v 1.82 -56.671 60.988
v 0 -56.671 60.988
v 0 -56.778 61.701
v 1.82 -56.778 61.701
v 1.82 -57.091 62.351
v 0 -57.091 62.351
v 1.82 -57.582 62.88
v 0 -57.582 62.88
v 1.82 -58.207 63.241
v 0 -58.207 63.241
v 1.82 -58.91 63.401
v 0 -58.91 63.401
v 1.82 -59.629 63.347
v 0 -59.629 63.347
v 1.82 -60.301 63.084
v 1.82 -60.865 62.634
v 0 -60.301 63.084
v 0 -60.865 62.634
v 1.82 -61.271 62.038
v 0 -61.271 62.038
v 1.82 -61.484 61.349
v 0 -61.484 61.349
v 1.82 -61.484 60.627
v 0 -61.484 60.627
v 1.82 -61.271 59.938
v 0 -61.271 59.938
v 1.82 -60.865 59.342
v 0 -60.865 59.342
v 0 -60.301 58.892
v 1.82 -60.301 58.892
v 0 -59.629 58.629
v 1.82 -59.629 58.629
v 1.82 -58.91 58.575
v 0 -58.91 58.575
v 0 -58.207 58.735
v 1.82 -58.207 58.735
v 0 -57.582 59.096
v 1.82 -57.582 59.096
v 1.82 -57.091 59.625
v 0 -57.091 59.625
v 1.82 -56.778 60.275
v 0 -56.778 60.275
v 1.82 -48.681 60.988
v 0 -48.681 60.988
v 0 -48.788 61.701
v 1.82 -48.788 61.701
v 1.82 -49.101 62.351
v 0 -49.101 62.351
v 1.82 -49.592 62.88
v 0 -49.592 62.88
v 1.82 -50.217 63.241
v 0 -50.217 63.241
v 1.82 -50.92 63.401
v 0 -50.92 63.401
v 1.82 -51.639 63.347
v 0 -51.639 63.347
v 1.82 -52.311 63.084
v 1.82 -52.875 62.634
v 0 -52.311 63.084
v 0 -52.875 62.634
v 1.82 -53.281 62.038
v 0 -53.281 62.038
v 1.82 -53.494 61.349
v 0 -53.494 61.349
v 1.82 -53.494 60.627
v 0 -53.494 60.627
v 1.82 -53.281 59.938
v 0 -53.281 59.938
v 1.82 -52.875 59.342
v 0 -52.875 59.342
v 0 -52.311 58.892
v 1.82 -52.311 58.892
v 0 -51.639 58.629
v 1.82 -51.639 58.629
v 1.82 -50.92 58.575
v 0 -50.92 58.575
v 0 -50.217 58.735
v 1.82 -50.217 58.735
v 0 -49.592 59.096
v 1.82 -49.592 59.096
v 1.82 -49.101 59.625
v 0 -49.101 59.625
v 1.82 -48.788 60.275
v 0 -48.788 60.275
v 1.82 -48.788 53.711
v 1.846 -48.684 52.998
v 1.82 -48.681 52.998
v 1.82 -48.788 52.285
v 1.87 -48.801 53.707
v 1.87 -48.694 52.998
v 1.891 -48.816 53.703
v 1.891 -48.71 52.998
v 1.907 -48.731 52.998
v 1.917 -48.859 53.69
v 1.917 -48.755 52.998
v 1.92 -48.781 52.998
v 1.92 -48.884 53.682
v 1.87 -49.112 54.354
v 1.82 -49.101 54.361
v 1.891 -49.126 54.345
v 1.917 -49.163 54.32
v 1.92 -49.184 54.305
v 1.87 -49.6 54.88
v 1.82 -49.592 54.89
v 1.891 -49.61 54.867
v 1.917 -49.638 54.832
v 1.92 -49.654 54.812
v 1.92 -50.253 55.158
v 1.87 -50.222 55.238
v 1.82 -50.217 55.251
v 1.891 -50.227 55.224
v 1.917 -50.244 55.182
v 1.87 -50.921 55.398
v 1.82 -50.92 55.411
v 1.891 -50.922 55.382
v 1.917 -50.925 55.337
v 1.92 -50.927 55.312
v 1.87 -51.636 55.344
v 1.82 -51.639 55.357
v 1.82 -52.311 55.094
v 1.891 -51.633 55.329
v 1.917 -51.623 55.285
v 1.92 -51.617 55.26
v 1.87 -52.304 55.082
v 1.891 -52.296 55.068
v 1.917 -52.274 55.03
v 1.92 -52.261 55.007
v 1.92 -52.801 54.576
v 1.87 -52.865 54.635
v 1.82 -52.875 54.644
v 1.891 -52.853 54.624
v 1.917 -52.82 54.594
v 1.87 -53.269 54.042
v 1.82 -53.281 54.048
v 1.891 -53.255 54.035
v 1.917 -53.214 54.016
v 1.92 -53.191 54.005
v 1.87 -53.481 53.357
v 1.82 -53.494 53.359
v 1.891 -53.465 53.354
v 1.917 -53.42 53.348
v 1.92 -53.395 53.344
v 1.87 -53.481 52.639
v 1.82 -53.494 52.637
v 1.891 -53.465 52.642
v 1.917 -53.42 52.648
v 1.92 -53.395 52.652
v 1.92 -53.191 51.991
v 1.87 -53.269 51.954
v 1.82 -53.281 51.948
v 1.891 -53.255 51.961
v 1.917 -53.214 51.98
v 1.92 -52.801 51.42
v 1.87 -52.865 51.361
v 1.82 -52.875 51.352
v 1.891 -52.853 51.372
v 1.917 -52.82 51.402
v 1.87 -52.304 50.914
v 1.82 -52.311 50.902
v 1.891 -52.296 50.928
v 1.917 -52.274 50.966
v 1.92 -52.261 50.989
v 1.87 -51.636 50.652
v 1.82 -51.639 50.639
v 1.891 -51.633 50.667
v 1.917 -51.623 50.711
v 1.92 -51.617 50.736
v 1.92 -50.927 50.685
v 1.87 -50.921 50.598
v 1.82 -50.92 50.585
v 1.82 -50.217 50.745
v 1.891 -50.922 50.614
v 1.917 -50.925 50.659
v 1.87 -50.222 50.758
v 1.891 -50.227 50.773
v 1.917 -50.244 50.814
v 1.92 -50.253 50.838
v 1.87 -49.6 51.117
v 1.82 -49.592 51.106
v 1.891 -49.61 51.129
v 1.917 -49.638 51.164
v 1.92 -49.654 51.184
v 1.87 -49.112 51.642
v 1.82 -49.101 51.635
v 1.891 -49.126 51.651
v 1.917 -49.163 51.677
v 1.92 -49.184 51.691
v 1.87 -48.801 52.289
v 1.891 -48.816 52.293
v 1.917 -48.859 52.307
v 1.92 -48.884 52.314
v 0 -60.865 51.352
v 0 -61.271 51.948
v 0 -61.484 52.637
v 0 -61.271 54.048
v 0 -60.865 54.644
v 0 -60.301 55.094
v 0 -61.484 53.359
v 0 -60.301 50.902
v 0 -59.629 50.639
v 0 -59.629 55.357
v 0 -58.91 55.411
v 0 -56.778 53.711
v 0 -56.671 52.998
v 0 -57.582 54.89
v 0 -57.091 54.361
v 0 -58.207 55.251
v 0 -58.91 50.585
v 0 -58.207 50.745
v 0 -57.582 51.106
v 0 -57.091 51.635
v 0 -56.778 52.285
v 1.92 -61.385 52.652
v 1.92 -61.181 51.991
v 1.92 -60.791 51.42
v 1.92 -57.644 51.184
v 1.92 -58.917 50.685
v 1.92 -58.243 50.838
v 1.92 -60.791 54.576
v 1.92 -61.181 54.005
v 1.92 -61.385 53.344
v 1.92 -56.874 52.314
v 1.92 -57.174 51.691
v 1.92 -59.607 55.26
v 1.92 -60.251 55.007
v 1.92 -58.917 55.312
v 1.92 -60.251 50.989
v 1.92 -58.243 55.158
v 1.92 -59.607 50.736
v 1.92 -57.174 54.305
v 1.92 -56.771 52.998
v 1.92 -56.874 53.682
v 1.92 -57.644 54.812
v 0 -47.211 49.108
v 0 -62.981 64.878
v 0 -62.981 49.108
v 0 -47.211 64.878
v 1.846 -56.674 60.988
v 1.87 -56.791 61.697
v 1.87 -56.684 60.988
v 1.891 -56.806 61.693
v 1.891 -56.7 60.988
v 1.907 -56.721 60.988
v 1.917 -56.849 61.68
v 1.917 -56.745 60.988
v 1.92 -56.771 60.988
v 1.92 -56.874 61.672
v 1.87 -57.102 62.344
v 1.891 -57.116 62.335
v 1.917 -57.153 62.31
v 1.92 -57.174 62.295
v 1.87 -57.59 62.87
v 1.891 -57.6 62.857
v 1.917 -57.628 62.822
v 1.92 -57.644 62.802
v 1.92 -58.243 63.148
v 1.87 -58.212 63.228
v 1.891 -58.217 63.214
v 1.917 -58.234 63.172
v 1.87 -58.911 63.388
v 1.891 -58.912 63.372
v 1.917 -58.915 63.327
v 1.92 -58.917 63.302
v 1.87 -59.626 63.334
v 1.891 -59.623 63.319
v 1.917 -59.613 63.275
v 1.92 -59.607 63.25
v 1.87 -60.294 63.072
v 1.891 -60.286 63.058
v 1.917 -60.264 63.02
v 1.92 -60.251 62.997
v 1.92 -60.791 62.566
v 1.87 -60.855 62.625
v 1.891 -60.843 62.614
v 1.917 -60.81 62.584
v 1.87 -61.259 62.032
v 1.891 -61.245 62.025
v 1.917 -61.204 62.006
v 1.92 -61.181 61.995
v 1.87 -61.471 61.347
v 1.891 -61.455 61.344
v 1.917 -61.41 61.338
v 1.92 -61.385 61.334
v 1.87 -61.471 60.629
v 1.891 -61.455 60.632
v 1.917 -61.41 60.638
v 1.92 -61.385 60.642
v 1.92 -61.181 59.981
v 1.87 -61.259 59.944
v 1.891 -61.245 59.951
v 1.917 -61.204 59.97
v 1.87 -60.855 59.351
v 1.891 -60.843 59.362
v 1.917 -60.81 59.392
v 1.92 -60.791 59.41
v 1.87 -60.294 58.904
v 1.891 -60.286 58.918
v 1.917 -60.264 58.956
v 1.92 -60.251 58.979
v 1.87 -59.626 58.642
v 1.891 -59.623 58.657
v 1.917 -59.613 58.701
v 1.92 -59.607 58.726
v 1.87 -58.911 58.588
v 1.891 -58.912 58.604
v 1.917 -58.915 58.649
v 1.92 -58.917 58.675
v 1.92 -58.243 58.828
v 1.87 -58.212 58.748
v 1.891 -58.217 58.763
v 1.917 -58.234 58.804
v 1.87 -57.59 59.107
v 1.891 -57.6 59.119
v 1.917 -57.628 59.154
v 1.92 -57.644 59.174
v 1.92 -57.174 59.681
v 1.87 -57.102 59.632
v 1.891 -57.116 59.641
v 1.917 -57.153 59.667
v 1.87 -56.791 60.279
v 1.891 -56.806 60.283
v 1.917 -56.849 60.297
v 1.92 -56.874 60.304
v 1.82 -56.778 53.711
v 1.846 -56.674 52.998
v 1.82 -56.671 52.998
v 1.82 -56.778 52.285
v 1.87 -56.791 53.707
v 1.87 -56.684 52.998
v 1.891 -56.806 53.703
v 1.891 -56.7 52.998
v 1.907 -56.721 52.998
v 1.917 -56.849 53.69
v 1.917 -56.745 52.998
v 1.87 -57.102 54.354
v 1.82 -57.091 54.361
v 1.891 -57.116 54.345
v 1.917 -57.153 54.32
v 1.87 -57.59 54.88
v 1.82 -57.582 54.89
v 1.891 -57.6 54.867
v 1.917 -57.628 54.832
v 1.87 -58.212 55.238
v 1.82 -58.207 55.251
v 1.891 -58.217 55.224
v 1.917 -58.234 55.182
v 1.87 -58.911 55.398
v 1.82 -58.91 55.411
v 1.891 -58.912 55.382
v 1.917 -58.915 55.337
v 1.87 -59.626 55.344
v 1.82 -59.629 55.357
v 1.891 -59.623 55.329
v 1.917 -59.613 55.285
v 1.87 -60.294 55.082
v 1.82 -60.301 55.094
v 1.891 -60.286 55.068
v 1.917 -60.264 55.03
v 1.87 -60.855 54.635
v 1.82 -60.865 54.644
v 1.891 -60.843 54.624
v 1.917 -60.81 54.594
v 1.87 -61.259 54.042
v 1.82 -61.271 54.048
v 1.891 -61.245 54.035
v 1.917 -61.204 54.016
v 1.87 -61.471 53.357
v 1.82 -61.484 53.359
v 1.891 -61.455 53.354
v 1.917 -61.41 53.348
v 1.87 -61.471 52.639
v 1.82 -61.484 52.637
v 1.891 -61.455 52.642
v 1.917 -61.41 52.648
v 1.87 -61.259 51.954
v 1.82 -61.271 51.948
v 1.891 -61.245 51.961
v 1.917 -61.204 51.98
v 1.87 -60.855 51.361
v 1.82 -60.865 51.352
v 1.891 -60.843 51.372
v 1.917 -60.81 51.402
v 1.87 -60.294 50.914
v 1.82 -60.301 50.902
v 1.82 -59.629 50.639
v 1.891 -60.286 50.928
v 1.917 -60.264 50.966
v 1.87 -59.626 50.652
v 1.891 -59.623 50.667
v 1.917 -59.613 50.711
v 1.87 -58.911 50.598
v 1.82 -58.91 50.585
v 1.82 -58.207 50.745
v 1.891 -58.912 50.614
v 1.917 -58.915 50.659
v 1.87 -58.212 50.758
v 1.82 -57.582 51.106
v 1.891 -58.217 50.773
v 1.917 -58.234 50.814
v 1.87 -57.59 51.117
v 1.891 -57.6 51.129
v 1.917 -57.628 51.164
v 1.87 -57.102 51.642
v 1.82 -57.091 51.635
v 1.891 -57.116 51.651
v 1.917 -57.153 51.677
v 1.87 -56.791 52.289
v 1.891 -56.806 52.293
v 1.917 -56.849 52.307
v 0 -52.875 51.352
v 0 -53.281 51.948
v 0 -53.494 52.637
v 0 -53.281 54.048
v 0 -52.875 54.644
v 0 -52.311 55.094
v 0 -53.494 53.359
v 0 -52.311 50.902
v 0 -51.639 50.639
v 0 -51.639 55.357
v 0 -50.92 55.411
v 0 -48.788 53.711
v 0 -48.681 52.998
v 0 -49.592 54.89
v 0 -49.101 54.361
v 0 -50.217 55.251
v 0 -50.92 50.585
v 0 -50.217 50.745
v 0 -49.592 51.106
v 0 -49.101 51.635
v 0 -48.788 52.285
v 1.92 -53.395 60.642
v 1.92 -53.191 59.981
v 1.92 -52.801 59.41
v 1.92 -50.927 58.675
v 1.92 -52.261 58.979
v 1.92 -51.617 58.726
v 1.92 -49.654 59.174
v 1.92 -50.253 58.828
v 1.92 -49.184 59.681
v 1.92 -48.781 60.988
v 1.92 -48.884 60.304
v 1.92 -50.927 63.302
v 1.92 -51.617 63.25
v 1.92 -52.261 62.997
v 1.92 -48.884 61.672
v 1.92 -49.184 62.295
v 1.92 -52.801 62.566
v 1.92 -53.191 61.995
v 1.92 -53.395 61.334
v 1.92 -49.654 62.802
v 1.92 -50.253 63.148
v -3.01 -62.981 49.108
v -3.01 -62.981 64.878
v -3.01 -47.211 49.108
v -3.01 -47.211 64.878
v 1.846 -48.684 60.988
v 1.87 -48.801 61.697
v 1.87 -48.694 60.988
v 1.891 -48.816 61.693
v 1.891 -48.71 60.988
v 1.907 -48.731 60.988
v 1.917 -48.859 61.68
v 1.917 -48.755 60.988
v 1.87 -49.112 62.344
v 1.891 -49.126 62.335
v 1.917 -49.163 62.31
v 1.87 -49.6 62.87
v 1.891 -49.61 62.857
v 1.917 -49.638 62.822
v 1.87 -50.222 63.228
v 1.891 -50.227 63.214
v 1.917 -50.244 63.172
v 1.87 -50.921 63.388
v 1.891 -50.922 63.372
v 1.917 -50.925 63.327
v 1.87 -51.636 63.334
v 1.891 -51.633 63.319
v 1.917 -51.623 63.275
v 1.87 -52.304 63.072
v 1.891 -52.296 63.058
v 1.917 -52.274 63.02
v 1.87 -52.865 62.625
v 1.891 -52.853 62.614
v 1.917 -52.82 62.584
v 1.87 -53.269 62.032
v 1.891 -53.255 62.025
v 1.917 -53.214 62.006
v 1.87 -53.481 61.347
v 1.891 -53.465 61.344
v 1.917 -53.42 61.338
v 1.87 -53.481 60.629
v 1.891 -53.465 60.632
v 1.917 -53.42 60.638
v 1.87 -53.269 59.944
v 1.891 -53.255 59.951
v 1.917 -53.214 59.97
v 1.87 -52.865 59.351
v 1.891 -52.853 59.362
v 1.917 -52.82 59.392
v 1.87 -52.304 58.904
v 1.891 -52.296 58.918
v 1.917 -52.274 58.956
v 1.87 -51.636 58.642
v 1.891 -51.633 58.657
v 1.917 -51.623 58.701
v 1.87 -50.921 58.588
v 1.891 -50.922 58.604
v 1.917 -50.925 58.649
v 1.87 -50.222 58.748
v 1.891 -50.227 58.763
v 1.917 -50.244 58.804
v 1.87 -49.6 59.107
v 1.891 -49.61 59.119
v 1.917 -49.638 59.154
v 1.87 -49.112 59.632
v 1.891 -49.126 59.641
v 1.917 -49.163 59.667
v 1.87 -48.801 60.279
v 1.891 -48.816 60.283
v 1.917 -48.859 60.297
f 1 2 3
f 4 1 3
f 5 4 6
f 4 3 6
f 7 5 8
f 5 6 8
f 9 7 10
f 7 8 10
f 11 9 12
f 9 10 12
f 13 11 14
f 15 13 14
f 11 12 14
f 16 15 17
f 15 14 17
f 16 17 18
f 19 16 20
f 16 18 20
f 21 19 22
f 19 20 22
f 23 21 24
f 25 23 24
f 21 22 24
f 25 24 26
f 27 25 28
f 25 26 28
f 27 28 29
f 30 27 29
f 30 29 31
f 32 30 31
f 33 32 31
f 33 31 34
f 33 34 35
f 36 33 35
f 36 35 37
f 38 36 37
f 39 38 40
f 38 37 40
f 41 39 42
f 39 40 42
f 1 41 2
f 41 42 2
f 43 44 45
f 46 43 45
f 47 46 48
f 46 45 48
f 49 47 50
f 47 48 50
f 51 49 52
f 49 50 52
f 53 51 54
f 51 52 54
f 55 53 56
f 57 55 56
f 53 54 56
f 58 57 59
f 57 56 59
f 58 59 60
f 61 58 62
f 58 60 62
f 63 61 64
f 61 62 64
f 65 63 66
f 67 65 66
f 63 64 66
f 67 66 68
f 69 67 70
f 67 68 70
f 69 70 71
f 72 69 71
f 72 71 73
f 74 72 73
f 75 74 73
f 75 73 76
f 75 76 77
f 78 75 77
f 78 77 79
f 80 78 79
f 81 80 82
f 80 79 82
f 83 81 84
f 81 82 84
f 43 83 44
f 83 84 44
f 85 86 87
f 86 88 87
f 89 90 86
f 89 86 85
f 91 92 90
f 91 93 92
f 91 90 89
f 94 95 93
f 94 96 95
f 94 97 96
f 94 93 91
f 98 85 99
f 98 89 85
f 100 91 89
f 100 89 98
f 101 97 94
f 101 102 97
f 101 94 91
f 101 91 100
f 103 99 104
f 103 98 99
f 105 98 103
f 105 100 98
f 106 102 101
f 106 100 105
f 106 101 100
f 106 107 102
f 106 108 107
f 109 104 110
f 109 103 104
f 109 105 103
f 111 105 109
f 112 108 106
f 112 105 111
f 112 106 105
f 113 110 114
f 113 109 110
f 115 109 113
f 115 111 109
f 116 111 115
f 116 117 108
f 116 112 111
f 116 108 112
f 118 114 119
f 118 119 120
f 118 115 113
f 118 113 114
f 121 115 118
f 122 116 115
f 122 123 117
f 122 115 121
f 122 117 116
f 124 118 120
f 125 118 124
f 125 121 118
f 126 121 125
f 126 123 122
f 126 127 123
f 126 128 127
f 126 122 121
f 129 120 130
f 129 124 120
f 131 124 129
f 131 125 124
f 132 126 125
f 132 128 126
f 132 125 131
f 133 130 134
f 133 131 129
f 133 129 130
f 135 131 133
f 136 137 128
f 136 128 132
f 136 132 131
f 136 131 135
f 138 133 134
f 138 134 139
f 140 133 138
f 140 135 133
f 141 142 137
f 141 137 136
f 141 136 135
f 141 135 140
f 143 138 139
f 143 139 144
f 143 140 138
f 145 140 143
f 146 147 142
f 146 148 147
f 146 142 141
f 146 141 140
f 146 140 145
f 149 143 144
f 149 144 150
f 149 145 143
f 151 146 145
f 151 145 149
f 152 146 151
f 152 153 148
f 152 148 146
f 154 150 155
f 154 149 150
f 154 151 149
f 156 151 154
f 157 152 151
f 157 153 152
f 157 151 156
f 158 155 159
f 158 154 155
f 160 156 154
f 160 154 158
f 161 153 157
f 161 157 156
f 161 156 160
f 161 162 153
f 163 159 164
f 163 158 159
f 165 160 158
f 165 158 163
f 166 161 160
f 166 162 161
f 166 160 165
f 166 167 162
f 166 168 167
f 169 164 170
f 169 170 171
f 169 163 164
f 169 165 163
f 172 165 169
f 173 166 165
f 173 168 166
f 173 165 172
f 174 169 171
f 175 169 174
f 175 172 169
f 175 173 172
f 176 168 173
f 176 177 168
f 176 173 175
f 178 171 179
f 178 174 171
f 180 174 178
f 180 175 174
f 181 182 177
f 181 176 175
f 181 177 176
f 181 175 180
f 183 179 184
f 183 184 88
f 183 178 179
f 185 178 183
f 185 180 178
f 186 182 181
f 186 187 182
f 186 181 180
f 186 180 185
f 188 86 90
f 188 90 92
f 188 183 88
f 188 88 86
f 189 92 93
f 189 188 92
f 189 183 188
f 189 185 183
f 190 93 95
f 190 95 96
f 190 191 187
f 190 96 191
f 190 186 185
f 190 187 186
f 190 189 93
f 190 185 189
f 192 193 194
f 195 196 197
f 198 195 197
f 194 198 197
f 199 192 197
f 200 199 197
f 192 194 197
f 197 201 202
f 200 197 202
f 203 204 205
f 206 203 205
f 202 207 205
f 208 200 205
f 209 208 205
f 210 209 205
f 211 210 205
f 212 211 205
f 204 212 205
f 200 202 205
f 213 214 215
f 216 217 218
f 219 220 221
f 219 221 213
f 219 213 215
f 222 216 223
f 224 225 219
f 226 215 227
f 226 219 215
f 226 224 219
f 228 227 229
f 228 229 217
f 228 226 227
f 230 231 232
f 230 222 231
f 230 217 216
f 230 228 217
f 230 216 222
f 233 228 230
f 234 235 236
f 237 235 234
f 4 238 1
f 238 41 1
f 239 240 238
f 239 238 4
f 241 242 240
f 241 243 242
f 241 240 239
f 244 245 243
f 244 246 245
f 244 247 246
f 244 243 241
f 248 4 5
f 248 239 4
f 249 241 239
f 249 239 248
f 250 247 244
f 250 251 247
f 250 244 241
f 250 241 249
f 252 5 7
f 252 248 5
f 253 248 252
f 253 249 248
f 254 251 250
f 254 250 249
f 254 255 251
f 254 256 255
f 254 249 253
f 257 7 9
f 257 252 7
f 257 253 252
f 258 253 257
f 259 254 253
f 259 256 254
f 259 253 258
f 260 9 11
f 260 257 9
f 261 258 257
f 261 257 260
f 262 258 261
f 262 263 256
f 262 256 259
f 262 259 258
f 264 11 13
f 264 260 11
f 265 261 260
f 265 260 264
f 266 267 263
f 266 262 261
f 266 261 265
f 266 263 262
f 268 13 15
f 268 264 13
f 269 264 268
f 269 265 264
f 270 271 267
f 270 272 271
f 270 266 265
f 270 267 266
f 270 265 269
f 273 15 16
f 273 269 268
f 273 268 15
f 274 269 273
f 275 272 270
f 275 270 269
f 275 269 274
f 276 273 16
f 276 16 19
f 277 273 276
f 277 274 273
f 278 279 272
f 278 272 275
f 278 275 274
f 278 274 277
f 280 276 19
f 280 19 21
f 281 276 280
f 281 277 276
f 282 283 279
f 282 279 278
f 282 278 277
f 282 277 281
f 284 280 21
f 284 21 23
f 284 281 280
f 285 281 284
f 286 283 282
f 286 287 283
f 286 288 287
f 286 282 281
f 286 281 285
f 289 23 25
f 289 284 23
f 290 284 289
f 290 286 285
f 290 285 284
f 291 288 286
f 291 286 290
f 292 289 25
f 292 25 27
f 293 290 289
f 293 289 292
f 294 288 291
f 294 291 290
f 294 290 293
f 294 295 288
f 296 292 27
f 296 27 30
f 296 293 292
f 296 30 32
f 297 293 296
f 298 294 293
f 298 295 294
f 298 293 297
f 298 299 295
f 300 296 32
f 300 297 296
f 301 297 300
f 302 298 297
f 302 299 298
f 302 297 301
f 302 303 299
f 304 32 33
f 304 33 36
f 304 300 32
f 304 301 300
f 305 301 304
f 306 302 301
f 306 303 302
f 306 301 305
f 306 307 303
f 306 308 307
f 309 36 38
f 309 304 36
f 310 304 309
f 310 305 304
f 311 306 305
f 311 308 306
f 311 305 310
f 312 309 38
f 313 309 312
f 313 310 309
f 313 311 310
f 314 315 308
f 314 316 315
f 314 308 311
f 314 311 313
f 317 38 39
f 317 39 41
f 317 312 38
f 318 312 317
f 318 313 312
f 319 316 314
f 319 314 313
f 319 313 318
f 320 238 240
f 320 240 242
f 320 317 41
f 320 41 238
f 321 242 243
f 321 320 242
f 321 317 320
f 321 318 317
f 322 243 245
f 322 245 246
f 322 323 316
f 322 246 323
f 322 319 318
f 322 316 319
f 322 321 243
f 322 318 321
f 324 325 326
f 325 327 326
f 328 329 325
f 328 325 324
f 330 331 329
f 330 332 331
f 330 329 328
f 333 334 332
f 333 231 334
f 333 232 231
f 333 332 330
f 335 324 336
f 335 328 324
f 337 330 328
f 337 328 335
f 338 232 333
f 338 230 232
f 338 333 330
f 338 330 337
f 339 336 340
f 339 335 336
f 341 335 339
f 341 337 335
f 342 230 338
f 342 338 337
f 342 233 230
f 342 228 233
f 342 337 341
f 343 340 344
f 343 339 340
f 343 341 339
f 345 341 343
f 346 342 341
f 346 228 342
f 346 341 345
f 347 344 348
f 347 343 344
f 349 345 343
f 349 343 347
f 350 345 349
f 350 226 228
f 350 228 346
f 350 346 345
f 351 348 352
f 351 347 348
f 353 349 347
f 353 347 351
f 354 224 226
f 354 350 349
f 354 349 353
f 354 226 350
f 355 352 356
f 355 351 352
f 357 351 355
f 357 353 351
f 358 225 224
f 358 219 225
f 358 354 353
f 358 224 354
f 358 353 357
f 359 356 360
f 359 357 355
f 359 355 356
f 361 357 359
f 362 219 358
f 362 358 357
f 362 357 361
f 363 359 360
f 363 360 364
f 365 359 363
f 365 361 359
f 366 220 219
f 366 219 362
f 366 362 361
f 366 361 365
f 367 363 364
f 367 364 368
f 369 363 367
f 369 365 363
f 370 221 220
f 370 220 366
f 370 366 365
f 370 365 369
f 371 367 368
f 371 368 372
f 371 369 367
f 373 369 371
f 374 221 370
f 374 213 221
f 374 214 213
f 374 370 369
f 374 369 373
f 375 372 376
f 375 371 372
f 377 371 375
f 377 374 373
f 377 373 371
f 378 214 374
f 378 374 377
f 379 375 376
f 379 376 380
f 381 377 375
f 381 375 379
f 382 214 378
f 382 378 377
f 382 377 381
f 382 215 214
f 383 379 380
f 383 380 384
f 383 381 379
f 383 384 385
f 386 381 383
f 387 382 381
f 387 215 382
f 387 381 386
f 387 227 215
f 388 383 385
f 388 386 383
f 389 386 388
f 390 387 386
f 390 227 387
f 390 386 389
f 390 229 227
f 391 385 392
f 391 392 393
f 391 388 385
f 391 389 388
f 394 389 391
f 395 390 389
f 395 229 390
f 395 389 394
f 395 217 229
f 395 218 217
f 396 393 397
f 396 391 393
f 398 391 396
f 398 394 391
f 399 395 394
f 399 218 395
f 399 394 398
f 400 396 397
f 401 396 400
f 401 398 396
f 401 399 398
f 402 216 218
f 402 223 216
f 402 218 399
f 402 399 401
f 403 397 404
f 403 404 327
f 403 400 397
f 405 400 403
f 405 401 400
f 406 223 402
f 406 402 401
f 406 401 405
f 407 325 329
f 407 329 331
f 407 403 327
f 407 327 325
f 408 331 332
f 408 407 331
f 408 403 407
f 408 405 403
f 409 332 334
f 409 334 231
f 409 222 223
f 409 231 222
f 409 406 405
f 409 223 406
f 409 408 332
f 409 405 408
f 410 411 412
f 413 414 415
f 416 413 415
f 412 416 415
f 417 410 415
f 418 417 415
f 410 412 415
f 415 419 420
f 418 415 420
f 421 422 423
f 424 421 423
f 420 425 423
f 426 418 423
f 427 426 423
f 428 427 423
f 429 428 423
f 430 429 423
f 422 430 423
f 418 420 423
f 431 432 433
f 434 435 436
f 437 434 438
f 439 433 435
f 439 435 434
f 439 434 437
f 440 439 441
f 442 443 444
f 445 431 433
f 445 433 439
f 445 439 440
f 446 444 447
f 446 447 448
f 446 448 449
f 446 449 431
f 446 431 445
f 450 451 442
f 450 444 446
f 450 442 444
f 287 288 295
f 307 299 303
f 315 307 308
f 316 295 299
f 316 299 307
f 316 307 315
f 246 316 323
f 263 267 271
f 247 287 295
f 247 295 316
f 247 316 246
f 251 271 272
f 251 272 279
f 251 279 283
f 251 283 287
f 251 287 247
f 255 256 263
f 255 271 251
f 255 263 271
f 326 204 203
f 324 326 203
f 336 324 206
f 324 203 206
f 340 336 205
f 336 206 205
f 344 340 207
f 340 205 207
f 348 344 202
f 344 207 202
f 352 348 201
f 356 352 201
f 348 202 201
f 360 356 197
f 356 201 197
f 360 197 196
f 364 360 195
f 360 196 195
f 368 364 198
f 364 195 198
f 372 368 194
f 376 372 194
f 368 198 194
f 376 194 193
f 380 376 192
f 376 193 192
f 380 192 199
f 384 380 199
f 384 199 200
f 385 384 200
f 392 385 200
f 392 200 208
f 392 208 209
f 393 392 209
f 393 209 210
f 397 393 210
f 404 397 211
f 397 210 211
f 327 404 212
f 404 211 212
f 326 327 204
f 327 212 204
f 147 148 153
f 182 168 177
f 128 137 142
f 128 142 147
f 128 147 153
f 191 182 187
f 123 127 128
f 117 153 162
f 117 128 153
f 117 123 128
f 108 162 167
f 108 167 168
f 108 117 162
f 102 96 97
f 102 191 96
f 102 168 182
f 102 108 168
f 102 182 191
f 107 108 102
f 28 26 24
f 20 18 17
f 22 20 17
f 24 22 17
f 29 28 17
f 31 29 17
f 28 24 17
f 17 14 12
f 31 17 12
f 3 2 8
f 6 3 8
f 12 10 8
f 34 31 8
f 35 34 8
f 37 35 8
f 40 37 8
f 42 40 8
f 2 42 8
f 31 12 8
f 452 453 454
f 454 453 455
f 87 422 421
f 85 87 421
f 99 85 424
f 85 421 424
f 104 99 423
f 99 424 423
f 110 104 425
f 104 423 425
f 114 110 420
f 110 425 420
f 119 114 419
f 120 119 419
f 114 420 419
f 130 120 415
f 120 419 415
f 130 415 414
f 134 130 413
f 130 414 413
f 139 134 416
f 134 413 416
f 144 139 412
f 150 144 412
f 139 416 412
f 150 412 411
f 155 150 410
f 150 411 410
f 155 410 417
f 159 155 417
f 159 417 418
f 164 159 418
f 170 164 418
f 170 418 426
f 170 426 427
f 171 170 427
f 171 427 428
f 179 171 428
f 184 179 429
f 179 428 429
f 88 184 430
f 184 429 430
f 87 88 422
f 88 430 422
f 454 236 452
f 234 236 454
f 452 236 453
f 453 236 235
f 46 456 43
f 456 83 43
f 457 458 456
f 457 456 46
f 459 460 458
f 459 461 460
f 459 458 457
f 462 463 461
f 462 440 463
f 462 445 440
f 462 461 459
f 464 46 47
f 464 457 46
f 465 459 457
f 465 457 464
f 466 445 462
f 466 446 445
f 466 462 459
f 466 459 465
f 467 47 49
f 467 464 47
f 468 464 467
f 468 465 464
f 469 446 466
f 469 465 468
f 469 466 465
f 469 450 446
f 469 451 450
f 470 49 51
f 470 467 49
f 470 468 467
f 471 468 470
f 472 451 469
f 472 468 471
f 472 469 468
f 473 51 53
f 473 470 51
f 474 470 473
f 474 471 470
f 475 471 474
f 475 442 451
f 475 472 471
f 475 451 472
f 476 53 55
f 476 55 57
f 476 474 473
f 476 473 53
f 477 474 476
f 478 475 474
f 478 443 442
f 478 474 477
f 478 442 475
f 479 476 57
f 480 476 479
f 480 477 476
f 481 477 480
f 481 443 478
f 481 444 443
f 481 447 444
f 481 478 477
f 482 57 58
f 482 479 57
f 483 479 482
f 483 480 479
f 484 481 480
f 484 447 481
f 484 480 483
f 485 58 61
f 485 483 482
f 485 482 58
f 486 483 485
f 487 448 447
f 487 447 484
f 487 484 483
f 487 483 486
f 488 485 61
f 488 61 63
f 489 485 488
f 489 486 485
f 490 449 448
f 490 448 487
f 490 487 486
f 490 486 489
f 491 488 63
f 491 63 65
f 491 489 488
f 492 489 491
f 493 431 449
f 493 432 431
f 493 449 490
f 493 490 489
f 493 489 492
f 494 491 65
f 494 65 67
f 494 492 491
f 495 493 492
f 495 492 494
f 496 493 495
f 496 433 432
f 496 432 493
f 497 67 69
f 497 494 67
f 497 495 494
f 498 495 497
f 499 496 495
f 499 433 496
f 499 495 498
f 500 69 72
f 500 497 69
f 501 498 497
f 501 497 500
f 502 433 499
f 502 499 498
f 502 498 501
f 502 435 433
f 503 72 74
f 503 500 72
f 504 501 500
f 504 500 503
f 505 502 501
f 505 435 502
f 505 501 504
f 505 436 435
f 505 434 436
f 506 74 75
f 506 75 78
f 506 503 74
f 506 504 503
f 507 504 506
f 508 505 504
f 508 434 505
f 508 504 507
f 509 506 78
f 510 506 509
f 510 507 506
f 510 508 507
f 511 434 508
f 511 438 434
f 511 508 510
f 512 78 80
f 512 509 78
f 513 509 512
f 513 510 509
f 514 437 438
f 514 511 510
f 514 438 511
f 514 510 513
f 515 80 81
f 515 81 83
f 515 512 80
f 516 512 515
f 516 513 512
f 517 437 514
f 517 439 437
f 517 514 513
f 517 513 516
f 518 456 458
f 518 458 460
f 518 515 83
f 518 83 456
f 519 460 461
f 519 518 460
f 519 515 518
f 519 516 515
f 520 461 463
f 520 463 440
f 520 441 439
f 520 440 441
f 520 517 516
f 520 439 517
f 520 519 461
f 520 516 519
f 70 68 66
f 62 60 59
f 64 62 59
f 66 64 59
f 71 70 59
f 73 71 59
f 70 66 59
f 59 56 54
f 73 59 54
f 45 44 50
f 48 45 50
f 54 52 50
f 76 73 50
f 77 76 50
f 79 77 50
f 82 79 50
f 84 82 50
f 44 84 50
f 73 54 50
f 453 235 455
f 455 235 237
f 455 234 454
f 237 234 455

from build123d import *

# Parameters (mm, degrees)
F0_R     = 2.42
F1_DEPTH = 1.92
F0_W     = 15.77
F0_H     = 15.77
F2_DEPTH = 3.01
F3_R     = 0.1
F3_2_R   = 0.1
F3_3_R   = 0.1
F3_4_R   = 0.1


with BuildPart() as f1:
    # F0 (on Right) → F1 (new body)
    with BuildSketch(Plane.YZ):
        with Locations((-59.0907996492, 60.9880724129)):
            Circle(F0_R)
    extrude(amount=F1_DEPTH)

    # F3#2
    f3_2_edges = [f1.edges().sort_by_distance(p)[0] for p in [
        (1.92, -61.5108, 60.988072),
    ]]
    fillet(f3_2_edges, radius=F3_2_R)


with BuildPart() as f1b:
    # F0 (on Right) → F1, piece 2 (new body)
    with BuildSketch(Plane.YZ):
        with Locations((-51.1007996492, 60.9880724129)):
            Circle(F0_R)
    extrude(amount=F1_DEPTH)

    # F3
    f3_edges = [f1b.edges().sort_by_distance(p)[0] for p in [
        (1.92, -53.5208, 60.988072),
    ]]
    fillet(f3_edges, radius=F3_R)


with BuildPart() as f1c:
    # F0 (on Right) → F1, piece 3 (new body)
    with BuildSketch(Plane.YZ):
        with Locations((-59.0907996492, 52.9980724129)):
            Circle(F0_R)
    extrude(amount=F1_DEPTH)

    # F3#3
    f3_3_edges = [f1c.edges().sort_by_distance(p)[0] for p in [
        (1.92, -61.5108, 52.998072),
    ]]
    fillet(f3_3_edges, radius=F3_3_R)


with BuildPart() as f1d:
    # F0 (on Right) → F1, piece 4 (new body)
    with BuildSketch(Plane.YZ):
        with Locations((-51.1007996492, 52.9980724129)):
            Circle(F0_R)
    extrude(amount=F1_DEPTH)

    # F3#4
    f3_4_edges = [f1d.edges().sort_by_distance(p)[0] for p in [
        (1.92, -53.5208, 52.998072),
    ]]
    fillet(f3_4_edges, radius=F3_4_R)


with BuildPart() as f2:
    # F0 (on Right) → F2 (new body)
    with BuildSketch(Plane.YZ):
        with Locations((-55.0957996492, 56.9930724129)):
            Rectangle(F0_W, F0_H)
        with Locations((-59.0907996492, 52.9980724129)):
            Circle(F0_R, mode=Mode.SUBTRACT)
        with Locations((-51.1007996492, 52.9980724129)):
            Circle(F0_R, mode=Mode.SUBTRACT)
        with Locations((-59.0907996492, 60.9880724129)):
            Circle(F0_R, mode=Mode.SUBTRACT)
        with Locations((-51.1007996492, 60.9880724129)):
            Circle(F0_R, mode=Mode.SUBTRACT)
        with Locations((-59.0907996492, 60.9880724129)):
            Circle(F0_R)
        with Locations((-51.1007996492, 60.9880724129)):
            Circle(F0_R)
        with Locations((-51.1007996492, 52.9980724129)):
            Circle(F0_R)
        with Locations((-59.0907996492, 52.9980724129)):
            Circle(F0_R)
    extrude(amount=-F2_DEPTH)


solid = Compound([f1.part, f1b.part, f1c.part, f1d.part, f2.part])
